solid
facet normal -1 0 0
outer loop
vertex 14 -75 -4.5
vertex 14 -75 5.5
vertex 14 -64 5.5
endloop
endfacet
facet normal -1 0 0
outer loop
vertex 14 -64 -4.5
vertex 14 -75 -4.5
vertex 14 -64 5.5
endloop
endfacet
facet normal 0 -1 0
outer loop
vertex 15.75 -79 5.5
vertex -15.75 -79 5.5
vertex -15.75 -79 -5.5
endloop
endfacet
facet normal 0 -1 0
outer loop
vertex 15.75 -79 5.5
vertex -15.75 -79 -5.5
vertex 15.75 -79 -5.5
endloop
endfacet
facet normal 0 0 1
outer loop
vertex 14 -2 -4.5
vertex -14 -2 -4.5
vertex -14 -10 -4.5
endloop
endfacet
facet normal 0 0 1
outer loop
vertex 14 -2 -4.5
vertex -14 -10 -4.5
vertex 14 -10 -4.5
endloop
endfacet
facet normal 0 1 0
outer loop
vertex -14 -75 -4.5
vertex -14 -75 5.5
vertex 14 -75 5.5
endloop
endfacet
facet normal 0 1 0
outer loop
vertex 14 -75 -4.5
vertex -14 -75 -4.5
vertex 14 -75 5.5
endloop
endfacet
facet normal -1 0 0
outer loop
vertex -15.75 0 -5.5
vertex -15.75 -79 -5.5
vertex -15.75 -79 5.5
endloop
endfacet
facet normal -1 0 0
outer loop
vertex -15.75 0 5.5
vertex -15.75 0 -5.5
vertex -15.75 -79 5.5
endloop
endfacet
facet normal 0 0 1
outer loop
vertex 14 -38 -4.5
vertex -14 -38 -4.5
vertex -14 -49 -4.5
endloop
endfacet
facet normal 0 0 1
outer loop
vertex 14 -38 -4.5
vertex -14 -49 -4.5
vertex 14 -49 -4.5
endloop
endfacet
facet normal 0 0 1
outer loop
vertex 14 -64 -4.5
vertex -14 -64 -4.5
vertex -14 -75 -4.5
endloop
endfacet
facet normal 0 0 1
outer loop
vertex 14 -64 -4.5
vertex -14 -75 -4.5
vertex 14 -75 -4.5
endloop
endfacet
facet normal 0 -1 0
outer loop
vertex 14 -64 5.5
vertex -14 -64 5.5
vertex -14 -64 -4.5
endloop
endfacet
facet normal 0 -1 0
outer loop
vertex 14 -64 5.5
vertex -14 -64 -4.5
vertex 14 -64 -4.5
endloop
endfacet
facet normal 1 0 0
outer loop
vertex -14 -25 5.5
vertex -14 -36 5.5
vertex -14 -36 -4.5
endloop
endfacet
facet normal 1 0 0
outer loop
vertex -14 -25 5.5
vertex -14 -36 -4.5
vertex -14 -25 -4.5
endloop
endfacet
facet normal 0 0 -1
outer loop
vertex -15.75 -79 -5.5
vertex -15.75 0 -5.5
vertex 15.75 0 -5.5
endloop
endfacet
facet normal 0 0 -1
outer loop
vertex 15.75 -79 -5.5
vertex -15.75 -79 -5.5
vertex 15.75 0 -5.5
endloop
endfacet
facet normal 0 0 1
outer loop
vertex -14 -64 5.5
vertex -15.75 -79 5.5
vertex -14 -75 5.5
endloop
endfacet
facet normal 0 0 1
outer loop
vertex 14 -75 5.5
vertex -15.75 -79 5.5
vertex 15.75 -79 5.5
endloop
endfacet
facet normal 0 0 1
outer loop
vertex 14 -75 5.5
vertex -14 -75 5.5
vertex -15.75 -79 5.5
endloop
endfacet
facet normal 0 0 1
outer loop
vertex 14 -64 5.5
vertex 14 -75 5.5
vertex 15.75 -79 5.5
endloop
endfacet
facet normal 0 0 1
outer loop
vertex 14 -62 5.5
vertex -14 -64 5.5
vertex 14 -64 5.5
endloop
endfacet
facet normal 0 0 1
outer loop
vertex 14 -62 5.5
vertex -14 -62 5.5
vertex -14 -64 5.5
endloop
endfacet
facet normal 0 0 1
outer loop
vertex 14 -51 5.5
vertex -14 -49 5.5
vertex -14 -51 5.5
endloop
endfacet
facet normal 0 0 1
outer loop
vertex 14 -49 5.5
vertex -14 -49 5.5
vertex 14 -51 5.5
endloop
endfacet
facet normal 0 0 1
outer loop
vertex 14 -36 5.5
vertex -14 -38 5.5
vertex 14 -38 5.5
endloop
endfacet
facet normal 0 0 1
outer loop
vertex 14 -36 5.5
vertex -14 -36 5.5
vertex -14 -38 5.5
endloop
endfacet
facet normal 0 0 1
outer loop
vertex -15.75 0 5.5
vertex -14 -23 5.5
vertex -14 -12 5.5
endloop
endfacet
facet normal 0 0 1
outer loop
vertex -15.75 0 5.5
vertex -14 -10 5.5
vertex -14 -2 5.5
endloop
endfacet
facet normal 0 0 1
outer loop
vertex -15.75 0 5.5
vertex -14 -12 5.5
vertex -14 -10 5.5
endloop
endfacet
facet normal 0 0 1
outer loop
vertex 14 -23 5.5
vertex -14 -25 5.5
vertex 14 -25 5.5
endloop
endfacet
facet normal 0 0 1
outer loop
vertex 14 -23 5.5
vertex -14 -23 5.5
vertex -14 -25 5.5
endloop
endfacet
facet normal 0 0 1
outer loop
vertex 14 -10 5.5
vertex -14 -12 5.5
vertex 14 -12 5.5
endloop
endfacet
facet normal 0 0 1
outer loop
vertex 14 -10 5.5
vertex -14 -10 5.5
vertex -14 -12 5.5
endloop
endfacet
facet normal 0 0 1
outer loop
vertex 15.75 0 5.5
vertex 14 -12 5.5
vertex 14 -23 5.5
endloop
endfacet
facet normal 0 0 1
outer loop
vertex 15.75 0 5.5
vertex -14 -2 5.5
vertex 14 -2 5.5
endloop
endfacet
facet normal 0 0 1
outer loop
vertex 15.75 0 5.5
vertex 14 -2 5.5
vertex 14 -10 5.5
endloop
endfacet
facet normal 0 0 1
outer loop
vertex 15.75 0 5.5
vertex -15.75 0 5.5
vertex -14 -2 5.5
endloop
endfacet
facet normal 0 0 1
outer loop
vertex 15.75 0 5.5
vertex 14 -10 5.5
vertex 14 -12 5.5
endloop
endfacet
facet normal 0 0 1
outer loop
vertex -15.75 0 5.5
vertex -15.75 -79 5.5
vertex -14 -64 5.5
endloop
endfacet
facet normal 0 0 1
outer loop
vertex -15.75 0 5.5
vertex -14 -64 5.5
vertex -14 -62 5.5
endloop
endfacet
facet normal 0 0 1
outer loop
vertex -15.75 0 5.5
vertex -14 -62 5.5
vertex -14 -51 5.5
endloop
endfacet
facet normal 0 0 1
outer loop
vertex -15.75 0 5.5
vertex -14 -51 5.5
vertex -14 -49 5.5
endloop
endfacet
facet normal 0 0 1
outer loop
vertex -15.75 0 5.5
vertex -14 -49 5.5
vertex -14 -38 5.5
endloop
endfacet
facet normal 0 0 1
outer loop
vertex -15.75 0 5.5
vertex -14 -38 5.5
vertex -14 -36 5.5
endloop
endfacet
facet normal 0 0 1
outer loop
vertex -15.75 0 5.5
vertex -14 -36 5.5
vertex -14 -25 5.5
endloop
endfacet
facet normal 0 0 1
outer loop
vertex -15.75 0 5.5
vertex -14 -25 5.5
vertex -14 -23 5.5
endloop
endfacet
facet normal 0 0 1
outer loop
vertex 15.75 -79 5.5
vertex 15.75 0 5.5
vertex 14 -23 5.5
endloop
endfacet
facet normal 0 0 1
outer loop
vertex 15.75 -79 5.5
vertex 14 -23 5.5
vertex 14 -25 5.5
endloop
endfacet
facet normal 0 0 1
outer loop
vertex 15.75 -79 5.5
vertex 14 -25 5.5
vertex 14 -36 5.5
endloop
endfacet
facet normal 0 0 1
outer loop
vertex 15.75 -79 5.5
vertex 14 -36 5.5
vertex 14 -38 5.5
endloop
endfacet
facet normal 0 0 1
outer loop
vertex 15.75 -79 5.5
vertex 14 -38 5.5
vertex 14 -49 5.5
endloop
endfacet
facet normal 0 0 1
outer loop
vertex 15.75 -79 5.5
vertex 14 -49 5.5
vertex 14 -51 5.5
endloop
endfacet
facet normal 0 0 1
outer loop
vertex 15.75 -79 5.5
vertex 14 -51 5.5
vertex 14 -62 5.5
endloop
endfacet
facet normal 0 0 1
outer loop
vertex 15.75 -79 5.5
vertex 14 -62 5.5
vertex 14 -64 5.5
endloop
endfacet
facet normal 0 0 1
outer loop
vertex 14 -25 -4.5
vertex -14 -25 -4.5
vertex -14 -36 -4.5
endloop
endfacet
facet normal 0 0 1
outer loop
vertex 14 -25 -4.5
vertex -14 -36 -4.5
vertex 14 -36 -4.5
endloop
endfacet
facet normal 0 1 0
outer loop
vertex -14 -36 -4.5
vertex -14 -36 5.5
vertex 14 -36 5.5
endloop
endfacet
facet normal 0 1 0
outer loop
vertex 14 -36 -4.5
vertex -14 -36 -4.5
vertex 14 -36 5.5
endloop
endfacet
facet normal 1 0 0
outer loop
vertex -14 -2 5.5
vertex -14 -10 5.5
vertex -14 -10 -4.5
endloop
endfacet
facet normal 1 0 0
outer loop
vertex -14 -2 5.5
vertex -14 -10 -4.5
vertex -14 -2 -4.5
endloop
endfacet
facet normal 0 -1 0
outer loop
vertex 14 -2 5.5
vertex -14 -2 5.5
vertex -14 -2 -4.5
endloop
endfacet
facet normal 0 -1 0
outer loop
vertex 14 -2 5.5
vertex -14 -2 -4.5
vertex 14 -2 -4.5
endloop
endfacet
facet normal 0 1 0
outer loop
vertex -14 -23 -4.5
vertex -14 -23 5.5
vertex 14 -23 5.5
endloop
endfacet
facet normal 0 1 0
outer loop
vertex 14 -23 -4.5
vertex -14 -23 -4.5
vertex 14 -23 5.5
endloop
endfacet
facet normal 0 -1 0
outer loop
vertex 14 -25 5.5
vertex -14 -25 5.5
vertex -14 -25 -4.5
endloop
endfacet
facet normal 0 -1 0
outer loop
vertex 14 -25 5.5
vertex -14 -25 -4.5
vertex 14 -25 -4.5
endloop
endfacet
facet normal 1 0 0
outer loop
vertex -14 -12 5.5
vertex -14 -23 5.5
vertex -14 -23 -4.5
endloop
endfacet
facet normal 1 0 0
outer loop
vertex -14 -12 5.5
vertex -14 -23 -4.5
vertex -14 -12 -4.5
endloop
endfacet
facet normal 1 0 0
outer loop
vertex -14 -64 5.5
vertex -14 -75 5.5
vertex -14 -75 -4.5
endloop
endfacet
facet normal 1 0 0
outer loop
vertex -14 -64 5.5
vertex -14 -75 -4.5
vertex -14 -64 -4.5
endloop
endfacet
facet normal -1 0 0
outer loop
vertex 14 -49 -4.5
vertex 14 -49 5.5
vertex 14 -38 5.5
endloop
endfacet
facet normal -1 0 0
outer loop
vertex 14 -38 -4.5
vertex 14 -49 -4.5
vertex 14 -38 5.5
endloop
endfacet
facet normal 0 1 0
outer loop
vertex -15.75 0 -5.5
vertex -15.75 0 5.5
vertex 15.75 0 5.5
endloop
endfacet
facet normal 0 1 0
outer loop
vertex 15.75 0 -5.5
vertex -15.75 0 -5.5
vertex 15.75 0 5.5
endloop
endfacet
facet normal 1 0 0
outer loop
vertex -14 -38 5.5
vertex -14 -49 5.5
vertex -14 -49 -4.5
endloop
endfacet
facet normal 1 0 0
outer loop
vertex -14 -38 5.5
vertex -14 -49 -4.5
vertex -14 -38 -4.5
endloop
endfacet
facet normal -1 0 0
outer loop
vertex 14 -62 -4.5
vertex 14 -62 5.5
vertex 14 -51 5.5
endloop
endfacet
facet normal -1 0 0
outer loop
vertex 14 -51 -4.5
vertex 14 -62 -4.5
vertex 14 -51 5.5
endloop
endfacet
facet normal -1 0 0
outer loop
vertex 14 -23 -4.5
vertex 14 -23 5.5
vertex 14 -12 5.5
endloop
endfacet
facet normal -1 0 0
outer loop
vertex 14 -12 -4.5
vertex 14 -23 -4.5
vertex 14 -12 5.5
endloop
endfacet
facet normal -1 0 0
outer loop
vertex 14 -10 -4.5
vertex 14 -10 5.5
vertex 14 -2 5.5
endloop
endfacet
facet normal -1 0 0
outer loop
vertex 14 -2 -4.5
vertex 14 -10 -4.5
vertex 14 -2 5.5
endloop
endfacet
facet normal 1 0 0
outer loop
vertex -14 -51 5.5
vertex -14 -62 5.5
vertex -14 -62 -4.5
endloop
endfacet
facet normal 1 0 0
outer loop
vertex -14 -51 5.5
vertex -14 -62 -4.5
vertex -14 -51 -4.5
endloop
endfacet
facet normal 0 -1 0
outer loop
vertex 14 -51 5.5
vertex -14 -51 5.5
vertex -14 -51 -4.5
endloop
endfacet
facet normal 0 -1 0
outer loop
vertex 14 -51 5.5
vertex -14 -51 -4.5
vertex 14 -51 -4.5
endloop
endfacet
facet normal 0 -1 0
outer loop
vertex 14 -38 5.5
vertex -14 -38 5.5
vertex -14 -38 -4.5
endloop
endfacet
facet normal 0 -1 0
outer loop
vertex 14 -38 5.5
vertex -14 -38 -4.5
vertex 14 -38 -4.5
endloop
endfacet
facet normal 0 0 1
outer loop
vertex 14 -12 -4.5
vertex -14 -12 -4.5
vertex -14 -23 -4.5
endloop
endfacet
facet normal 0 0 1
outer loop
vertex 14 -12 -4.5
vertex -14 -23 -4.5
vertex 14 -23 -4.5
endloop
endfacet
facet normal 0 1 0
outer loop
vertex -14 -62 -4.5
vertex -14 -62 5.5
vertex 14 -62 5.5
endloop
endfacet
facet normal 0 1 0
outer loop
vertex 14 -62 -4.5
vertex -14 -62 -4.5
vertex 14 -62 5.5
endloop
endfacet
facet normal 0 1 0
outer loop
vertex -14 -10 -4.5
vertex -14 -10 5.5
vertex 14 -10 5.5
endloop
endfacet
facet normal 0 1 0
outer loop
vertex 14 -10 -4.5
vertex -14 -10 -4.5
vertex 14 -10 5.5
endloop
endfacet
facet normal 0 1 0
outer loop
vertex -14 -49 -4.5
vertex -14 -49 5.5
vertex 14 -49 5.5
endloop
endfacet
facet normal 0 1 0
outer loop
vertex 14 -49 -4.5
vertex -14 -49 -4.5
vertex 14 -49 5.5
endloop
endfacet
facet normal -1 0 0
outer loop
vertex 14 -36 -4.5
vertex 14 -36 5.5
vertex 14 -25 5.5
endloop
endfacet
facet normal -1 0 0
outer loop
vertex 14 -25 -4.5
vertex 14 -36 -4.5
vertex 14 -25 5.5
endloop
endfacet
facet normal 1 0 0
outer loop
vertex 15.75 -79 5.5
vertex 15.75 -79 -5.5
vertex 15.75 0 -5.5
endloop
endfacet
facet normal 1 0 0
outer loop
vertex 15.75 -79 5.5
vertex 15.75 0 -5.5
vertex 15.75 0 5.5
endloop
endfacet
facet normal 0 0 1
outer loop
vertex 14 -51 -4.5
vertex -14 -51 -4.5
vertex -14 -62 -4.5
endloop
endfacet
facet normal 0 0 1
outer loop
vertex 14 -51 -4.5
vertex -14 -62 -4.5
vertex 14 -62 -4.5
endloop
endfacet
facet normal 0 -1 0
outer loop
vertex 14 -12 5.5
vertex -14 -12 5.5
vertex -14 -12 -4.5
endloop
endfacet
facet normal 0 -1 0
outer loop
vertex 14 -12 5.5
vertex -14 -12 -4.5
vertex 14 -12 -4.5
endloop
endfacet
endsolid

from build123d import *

# Parameters (mm, degrees)
F0_W     = 31.5
F0_H     = 11
F1_DEPTH = 79
F2_W     = 28
F2_H     = 8
F2_H_2   = 11
F3_DEPTH = 10


with BuildPart() as f1:
    # F0 (on Front) → F1 (new body)
    with BuildSketch(Plane.XZ):
        Rectangle(F0_W, F0_H)
    extrude(amount=F1_DEPTH)

    # F2 (on face) → F3 (cut)
    with BuildSketch(Plane.XY.offset(5.5)):
        with Locations((0, -6)):
            Rectangle(F2_W, F2_H)
        with Locations((0, -17.5)):
            Rectangle(F2_W, F2_H_2)
        with Locations((0, -30.5)):
            Rectangle(F2_W, F2_H_2)
        with Locations((0, -43.5)):
            Rectangle(F2_W, F2_H_2)
        with Locations((0, -56.5)):
            Rectangle(F2_W, F2_H_2)
        with Locations((0, -69.5)):
            Rectangle(F2_W, F2_H_2)
    extrude(amount=-F3_DEPTH, mode=Mode.SUBTRACT)


solid = f1.part
